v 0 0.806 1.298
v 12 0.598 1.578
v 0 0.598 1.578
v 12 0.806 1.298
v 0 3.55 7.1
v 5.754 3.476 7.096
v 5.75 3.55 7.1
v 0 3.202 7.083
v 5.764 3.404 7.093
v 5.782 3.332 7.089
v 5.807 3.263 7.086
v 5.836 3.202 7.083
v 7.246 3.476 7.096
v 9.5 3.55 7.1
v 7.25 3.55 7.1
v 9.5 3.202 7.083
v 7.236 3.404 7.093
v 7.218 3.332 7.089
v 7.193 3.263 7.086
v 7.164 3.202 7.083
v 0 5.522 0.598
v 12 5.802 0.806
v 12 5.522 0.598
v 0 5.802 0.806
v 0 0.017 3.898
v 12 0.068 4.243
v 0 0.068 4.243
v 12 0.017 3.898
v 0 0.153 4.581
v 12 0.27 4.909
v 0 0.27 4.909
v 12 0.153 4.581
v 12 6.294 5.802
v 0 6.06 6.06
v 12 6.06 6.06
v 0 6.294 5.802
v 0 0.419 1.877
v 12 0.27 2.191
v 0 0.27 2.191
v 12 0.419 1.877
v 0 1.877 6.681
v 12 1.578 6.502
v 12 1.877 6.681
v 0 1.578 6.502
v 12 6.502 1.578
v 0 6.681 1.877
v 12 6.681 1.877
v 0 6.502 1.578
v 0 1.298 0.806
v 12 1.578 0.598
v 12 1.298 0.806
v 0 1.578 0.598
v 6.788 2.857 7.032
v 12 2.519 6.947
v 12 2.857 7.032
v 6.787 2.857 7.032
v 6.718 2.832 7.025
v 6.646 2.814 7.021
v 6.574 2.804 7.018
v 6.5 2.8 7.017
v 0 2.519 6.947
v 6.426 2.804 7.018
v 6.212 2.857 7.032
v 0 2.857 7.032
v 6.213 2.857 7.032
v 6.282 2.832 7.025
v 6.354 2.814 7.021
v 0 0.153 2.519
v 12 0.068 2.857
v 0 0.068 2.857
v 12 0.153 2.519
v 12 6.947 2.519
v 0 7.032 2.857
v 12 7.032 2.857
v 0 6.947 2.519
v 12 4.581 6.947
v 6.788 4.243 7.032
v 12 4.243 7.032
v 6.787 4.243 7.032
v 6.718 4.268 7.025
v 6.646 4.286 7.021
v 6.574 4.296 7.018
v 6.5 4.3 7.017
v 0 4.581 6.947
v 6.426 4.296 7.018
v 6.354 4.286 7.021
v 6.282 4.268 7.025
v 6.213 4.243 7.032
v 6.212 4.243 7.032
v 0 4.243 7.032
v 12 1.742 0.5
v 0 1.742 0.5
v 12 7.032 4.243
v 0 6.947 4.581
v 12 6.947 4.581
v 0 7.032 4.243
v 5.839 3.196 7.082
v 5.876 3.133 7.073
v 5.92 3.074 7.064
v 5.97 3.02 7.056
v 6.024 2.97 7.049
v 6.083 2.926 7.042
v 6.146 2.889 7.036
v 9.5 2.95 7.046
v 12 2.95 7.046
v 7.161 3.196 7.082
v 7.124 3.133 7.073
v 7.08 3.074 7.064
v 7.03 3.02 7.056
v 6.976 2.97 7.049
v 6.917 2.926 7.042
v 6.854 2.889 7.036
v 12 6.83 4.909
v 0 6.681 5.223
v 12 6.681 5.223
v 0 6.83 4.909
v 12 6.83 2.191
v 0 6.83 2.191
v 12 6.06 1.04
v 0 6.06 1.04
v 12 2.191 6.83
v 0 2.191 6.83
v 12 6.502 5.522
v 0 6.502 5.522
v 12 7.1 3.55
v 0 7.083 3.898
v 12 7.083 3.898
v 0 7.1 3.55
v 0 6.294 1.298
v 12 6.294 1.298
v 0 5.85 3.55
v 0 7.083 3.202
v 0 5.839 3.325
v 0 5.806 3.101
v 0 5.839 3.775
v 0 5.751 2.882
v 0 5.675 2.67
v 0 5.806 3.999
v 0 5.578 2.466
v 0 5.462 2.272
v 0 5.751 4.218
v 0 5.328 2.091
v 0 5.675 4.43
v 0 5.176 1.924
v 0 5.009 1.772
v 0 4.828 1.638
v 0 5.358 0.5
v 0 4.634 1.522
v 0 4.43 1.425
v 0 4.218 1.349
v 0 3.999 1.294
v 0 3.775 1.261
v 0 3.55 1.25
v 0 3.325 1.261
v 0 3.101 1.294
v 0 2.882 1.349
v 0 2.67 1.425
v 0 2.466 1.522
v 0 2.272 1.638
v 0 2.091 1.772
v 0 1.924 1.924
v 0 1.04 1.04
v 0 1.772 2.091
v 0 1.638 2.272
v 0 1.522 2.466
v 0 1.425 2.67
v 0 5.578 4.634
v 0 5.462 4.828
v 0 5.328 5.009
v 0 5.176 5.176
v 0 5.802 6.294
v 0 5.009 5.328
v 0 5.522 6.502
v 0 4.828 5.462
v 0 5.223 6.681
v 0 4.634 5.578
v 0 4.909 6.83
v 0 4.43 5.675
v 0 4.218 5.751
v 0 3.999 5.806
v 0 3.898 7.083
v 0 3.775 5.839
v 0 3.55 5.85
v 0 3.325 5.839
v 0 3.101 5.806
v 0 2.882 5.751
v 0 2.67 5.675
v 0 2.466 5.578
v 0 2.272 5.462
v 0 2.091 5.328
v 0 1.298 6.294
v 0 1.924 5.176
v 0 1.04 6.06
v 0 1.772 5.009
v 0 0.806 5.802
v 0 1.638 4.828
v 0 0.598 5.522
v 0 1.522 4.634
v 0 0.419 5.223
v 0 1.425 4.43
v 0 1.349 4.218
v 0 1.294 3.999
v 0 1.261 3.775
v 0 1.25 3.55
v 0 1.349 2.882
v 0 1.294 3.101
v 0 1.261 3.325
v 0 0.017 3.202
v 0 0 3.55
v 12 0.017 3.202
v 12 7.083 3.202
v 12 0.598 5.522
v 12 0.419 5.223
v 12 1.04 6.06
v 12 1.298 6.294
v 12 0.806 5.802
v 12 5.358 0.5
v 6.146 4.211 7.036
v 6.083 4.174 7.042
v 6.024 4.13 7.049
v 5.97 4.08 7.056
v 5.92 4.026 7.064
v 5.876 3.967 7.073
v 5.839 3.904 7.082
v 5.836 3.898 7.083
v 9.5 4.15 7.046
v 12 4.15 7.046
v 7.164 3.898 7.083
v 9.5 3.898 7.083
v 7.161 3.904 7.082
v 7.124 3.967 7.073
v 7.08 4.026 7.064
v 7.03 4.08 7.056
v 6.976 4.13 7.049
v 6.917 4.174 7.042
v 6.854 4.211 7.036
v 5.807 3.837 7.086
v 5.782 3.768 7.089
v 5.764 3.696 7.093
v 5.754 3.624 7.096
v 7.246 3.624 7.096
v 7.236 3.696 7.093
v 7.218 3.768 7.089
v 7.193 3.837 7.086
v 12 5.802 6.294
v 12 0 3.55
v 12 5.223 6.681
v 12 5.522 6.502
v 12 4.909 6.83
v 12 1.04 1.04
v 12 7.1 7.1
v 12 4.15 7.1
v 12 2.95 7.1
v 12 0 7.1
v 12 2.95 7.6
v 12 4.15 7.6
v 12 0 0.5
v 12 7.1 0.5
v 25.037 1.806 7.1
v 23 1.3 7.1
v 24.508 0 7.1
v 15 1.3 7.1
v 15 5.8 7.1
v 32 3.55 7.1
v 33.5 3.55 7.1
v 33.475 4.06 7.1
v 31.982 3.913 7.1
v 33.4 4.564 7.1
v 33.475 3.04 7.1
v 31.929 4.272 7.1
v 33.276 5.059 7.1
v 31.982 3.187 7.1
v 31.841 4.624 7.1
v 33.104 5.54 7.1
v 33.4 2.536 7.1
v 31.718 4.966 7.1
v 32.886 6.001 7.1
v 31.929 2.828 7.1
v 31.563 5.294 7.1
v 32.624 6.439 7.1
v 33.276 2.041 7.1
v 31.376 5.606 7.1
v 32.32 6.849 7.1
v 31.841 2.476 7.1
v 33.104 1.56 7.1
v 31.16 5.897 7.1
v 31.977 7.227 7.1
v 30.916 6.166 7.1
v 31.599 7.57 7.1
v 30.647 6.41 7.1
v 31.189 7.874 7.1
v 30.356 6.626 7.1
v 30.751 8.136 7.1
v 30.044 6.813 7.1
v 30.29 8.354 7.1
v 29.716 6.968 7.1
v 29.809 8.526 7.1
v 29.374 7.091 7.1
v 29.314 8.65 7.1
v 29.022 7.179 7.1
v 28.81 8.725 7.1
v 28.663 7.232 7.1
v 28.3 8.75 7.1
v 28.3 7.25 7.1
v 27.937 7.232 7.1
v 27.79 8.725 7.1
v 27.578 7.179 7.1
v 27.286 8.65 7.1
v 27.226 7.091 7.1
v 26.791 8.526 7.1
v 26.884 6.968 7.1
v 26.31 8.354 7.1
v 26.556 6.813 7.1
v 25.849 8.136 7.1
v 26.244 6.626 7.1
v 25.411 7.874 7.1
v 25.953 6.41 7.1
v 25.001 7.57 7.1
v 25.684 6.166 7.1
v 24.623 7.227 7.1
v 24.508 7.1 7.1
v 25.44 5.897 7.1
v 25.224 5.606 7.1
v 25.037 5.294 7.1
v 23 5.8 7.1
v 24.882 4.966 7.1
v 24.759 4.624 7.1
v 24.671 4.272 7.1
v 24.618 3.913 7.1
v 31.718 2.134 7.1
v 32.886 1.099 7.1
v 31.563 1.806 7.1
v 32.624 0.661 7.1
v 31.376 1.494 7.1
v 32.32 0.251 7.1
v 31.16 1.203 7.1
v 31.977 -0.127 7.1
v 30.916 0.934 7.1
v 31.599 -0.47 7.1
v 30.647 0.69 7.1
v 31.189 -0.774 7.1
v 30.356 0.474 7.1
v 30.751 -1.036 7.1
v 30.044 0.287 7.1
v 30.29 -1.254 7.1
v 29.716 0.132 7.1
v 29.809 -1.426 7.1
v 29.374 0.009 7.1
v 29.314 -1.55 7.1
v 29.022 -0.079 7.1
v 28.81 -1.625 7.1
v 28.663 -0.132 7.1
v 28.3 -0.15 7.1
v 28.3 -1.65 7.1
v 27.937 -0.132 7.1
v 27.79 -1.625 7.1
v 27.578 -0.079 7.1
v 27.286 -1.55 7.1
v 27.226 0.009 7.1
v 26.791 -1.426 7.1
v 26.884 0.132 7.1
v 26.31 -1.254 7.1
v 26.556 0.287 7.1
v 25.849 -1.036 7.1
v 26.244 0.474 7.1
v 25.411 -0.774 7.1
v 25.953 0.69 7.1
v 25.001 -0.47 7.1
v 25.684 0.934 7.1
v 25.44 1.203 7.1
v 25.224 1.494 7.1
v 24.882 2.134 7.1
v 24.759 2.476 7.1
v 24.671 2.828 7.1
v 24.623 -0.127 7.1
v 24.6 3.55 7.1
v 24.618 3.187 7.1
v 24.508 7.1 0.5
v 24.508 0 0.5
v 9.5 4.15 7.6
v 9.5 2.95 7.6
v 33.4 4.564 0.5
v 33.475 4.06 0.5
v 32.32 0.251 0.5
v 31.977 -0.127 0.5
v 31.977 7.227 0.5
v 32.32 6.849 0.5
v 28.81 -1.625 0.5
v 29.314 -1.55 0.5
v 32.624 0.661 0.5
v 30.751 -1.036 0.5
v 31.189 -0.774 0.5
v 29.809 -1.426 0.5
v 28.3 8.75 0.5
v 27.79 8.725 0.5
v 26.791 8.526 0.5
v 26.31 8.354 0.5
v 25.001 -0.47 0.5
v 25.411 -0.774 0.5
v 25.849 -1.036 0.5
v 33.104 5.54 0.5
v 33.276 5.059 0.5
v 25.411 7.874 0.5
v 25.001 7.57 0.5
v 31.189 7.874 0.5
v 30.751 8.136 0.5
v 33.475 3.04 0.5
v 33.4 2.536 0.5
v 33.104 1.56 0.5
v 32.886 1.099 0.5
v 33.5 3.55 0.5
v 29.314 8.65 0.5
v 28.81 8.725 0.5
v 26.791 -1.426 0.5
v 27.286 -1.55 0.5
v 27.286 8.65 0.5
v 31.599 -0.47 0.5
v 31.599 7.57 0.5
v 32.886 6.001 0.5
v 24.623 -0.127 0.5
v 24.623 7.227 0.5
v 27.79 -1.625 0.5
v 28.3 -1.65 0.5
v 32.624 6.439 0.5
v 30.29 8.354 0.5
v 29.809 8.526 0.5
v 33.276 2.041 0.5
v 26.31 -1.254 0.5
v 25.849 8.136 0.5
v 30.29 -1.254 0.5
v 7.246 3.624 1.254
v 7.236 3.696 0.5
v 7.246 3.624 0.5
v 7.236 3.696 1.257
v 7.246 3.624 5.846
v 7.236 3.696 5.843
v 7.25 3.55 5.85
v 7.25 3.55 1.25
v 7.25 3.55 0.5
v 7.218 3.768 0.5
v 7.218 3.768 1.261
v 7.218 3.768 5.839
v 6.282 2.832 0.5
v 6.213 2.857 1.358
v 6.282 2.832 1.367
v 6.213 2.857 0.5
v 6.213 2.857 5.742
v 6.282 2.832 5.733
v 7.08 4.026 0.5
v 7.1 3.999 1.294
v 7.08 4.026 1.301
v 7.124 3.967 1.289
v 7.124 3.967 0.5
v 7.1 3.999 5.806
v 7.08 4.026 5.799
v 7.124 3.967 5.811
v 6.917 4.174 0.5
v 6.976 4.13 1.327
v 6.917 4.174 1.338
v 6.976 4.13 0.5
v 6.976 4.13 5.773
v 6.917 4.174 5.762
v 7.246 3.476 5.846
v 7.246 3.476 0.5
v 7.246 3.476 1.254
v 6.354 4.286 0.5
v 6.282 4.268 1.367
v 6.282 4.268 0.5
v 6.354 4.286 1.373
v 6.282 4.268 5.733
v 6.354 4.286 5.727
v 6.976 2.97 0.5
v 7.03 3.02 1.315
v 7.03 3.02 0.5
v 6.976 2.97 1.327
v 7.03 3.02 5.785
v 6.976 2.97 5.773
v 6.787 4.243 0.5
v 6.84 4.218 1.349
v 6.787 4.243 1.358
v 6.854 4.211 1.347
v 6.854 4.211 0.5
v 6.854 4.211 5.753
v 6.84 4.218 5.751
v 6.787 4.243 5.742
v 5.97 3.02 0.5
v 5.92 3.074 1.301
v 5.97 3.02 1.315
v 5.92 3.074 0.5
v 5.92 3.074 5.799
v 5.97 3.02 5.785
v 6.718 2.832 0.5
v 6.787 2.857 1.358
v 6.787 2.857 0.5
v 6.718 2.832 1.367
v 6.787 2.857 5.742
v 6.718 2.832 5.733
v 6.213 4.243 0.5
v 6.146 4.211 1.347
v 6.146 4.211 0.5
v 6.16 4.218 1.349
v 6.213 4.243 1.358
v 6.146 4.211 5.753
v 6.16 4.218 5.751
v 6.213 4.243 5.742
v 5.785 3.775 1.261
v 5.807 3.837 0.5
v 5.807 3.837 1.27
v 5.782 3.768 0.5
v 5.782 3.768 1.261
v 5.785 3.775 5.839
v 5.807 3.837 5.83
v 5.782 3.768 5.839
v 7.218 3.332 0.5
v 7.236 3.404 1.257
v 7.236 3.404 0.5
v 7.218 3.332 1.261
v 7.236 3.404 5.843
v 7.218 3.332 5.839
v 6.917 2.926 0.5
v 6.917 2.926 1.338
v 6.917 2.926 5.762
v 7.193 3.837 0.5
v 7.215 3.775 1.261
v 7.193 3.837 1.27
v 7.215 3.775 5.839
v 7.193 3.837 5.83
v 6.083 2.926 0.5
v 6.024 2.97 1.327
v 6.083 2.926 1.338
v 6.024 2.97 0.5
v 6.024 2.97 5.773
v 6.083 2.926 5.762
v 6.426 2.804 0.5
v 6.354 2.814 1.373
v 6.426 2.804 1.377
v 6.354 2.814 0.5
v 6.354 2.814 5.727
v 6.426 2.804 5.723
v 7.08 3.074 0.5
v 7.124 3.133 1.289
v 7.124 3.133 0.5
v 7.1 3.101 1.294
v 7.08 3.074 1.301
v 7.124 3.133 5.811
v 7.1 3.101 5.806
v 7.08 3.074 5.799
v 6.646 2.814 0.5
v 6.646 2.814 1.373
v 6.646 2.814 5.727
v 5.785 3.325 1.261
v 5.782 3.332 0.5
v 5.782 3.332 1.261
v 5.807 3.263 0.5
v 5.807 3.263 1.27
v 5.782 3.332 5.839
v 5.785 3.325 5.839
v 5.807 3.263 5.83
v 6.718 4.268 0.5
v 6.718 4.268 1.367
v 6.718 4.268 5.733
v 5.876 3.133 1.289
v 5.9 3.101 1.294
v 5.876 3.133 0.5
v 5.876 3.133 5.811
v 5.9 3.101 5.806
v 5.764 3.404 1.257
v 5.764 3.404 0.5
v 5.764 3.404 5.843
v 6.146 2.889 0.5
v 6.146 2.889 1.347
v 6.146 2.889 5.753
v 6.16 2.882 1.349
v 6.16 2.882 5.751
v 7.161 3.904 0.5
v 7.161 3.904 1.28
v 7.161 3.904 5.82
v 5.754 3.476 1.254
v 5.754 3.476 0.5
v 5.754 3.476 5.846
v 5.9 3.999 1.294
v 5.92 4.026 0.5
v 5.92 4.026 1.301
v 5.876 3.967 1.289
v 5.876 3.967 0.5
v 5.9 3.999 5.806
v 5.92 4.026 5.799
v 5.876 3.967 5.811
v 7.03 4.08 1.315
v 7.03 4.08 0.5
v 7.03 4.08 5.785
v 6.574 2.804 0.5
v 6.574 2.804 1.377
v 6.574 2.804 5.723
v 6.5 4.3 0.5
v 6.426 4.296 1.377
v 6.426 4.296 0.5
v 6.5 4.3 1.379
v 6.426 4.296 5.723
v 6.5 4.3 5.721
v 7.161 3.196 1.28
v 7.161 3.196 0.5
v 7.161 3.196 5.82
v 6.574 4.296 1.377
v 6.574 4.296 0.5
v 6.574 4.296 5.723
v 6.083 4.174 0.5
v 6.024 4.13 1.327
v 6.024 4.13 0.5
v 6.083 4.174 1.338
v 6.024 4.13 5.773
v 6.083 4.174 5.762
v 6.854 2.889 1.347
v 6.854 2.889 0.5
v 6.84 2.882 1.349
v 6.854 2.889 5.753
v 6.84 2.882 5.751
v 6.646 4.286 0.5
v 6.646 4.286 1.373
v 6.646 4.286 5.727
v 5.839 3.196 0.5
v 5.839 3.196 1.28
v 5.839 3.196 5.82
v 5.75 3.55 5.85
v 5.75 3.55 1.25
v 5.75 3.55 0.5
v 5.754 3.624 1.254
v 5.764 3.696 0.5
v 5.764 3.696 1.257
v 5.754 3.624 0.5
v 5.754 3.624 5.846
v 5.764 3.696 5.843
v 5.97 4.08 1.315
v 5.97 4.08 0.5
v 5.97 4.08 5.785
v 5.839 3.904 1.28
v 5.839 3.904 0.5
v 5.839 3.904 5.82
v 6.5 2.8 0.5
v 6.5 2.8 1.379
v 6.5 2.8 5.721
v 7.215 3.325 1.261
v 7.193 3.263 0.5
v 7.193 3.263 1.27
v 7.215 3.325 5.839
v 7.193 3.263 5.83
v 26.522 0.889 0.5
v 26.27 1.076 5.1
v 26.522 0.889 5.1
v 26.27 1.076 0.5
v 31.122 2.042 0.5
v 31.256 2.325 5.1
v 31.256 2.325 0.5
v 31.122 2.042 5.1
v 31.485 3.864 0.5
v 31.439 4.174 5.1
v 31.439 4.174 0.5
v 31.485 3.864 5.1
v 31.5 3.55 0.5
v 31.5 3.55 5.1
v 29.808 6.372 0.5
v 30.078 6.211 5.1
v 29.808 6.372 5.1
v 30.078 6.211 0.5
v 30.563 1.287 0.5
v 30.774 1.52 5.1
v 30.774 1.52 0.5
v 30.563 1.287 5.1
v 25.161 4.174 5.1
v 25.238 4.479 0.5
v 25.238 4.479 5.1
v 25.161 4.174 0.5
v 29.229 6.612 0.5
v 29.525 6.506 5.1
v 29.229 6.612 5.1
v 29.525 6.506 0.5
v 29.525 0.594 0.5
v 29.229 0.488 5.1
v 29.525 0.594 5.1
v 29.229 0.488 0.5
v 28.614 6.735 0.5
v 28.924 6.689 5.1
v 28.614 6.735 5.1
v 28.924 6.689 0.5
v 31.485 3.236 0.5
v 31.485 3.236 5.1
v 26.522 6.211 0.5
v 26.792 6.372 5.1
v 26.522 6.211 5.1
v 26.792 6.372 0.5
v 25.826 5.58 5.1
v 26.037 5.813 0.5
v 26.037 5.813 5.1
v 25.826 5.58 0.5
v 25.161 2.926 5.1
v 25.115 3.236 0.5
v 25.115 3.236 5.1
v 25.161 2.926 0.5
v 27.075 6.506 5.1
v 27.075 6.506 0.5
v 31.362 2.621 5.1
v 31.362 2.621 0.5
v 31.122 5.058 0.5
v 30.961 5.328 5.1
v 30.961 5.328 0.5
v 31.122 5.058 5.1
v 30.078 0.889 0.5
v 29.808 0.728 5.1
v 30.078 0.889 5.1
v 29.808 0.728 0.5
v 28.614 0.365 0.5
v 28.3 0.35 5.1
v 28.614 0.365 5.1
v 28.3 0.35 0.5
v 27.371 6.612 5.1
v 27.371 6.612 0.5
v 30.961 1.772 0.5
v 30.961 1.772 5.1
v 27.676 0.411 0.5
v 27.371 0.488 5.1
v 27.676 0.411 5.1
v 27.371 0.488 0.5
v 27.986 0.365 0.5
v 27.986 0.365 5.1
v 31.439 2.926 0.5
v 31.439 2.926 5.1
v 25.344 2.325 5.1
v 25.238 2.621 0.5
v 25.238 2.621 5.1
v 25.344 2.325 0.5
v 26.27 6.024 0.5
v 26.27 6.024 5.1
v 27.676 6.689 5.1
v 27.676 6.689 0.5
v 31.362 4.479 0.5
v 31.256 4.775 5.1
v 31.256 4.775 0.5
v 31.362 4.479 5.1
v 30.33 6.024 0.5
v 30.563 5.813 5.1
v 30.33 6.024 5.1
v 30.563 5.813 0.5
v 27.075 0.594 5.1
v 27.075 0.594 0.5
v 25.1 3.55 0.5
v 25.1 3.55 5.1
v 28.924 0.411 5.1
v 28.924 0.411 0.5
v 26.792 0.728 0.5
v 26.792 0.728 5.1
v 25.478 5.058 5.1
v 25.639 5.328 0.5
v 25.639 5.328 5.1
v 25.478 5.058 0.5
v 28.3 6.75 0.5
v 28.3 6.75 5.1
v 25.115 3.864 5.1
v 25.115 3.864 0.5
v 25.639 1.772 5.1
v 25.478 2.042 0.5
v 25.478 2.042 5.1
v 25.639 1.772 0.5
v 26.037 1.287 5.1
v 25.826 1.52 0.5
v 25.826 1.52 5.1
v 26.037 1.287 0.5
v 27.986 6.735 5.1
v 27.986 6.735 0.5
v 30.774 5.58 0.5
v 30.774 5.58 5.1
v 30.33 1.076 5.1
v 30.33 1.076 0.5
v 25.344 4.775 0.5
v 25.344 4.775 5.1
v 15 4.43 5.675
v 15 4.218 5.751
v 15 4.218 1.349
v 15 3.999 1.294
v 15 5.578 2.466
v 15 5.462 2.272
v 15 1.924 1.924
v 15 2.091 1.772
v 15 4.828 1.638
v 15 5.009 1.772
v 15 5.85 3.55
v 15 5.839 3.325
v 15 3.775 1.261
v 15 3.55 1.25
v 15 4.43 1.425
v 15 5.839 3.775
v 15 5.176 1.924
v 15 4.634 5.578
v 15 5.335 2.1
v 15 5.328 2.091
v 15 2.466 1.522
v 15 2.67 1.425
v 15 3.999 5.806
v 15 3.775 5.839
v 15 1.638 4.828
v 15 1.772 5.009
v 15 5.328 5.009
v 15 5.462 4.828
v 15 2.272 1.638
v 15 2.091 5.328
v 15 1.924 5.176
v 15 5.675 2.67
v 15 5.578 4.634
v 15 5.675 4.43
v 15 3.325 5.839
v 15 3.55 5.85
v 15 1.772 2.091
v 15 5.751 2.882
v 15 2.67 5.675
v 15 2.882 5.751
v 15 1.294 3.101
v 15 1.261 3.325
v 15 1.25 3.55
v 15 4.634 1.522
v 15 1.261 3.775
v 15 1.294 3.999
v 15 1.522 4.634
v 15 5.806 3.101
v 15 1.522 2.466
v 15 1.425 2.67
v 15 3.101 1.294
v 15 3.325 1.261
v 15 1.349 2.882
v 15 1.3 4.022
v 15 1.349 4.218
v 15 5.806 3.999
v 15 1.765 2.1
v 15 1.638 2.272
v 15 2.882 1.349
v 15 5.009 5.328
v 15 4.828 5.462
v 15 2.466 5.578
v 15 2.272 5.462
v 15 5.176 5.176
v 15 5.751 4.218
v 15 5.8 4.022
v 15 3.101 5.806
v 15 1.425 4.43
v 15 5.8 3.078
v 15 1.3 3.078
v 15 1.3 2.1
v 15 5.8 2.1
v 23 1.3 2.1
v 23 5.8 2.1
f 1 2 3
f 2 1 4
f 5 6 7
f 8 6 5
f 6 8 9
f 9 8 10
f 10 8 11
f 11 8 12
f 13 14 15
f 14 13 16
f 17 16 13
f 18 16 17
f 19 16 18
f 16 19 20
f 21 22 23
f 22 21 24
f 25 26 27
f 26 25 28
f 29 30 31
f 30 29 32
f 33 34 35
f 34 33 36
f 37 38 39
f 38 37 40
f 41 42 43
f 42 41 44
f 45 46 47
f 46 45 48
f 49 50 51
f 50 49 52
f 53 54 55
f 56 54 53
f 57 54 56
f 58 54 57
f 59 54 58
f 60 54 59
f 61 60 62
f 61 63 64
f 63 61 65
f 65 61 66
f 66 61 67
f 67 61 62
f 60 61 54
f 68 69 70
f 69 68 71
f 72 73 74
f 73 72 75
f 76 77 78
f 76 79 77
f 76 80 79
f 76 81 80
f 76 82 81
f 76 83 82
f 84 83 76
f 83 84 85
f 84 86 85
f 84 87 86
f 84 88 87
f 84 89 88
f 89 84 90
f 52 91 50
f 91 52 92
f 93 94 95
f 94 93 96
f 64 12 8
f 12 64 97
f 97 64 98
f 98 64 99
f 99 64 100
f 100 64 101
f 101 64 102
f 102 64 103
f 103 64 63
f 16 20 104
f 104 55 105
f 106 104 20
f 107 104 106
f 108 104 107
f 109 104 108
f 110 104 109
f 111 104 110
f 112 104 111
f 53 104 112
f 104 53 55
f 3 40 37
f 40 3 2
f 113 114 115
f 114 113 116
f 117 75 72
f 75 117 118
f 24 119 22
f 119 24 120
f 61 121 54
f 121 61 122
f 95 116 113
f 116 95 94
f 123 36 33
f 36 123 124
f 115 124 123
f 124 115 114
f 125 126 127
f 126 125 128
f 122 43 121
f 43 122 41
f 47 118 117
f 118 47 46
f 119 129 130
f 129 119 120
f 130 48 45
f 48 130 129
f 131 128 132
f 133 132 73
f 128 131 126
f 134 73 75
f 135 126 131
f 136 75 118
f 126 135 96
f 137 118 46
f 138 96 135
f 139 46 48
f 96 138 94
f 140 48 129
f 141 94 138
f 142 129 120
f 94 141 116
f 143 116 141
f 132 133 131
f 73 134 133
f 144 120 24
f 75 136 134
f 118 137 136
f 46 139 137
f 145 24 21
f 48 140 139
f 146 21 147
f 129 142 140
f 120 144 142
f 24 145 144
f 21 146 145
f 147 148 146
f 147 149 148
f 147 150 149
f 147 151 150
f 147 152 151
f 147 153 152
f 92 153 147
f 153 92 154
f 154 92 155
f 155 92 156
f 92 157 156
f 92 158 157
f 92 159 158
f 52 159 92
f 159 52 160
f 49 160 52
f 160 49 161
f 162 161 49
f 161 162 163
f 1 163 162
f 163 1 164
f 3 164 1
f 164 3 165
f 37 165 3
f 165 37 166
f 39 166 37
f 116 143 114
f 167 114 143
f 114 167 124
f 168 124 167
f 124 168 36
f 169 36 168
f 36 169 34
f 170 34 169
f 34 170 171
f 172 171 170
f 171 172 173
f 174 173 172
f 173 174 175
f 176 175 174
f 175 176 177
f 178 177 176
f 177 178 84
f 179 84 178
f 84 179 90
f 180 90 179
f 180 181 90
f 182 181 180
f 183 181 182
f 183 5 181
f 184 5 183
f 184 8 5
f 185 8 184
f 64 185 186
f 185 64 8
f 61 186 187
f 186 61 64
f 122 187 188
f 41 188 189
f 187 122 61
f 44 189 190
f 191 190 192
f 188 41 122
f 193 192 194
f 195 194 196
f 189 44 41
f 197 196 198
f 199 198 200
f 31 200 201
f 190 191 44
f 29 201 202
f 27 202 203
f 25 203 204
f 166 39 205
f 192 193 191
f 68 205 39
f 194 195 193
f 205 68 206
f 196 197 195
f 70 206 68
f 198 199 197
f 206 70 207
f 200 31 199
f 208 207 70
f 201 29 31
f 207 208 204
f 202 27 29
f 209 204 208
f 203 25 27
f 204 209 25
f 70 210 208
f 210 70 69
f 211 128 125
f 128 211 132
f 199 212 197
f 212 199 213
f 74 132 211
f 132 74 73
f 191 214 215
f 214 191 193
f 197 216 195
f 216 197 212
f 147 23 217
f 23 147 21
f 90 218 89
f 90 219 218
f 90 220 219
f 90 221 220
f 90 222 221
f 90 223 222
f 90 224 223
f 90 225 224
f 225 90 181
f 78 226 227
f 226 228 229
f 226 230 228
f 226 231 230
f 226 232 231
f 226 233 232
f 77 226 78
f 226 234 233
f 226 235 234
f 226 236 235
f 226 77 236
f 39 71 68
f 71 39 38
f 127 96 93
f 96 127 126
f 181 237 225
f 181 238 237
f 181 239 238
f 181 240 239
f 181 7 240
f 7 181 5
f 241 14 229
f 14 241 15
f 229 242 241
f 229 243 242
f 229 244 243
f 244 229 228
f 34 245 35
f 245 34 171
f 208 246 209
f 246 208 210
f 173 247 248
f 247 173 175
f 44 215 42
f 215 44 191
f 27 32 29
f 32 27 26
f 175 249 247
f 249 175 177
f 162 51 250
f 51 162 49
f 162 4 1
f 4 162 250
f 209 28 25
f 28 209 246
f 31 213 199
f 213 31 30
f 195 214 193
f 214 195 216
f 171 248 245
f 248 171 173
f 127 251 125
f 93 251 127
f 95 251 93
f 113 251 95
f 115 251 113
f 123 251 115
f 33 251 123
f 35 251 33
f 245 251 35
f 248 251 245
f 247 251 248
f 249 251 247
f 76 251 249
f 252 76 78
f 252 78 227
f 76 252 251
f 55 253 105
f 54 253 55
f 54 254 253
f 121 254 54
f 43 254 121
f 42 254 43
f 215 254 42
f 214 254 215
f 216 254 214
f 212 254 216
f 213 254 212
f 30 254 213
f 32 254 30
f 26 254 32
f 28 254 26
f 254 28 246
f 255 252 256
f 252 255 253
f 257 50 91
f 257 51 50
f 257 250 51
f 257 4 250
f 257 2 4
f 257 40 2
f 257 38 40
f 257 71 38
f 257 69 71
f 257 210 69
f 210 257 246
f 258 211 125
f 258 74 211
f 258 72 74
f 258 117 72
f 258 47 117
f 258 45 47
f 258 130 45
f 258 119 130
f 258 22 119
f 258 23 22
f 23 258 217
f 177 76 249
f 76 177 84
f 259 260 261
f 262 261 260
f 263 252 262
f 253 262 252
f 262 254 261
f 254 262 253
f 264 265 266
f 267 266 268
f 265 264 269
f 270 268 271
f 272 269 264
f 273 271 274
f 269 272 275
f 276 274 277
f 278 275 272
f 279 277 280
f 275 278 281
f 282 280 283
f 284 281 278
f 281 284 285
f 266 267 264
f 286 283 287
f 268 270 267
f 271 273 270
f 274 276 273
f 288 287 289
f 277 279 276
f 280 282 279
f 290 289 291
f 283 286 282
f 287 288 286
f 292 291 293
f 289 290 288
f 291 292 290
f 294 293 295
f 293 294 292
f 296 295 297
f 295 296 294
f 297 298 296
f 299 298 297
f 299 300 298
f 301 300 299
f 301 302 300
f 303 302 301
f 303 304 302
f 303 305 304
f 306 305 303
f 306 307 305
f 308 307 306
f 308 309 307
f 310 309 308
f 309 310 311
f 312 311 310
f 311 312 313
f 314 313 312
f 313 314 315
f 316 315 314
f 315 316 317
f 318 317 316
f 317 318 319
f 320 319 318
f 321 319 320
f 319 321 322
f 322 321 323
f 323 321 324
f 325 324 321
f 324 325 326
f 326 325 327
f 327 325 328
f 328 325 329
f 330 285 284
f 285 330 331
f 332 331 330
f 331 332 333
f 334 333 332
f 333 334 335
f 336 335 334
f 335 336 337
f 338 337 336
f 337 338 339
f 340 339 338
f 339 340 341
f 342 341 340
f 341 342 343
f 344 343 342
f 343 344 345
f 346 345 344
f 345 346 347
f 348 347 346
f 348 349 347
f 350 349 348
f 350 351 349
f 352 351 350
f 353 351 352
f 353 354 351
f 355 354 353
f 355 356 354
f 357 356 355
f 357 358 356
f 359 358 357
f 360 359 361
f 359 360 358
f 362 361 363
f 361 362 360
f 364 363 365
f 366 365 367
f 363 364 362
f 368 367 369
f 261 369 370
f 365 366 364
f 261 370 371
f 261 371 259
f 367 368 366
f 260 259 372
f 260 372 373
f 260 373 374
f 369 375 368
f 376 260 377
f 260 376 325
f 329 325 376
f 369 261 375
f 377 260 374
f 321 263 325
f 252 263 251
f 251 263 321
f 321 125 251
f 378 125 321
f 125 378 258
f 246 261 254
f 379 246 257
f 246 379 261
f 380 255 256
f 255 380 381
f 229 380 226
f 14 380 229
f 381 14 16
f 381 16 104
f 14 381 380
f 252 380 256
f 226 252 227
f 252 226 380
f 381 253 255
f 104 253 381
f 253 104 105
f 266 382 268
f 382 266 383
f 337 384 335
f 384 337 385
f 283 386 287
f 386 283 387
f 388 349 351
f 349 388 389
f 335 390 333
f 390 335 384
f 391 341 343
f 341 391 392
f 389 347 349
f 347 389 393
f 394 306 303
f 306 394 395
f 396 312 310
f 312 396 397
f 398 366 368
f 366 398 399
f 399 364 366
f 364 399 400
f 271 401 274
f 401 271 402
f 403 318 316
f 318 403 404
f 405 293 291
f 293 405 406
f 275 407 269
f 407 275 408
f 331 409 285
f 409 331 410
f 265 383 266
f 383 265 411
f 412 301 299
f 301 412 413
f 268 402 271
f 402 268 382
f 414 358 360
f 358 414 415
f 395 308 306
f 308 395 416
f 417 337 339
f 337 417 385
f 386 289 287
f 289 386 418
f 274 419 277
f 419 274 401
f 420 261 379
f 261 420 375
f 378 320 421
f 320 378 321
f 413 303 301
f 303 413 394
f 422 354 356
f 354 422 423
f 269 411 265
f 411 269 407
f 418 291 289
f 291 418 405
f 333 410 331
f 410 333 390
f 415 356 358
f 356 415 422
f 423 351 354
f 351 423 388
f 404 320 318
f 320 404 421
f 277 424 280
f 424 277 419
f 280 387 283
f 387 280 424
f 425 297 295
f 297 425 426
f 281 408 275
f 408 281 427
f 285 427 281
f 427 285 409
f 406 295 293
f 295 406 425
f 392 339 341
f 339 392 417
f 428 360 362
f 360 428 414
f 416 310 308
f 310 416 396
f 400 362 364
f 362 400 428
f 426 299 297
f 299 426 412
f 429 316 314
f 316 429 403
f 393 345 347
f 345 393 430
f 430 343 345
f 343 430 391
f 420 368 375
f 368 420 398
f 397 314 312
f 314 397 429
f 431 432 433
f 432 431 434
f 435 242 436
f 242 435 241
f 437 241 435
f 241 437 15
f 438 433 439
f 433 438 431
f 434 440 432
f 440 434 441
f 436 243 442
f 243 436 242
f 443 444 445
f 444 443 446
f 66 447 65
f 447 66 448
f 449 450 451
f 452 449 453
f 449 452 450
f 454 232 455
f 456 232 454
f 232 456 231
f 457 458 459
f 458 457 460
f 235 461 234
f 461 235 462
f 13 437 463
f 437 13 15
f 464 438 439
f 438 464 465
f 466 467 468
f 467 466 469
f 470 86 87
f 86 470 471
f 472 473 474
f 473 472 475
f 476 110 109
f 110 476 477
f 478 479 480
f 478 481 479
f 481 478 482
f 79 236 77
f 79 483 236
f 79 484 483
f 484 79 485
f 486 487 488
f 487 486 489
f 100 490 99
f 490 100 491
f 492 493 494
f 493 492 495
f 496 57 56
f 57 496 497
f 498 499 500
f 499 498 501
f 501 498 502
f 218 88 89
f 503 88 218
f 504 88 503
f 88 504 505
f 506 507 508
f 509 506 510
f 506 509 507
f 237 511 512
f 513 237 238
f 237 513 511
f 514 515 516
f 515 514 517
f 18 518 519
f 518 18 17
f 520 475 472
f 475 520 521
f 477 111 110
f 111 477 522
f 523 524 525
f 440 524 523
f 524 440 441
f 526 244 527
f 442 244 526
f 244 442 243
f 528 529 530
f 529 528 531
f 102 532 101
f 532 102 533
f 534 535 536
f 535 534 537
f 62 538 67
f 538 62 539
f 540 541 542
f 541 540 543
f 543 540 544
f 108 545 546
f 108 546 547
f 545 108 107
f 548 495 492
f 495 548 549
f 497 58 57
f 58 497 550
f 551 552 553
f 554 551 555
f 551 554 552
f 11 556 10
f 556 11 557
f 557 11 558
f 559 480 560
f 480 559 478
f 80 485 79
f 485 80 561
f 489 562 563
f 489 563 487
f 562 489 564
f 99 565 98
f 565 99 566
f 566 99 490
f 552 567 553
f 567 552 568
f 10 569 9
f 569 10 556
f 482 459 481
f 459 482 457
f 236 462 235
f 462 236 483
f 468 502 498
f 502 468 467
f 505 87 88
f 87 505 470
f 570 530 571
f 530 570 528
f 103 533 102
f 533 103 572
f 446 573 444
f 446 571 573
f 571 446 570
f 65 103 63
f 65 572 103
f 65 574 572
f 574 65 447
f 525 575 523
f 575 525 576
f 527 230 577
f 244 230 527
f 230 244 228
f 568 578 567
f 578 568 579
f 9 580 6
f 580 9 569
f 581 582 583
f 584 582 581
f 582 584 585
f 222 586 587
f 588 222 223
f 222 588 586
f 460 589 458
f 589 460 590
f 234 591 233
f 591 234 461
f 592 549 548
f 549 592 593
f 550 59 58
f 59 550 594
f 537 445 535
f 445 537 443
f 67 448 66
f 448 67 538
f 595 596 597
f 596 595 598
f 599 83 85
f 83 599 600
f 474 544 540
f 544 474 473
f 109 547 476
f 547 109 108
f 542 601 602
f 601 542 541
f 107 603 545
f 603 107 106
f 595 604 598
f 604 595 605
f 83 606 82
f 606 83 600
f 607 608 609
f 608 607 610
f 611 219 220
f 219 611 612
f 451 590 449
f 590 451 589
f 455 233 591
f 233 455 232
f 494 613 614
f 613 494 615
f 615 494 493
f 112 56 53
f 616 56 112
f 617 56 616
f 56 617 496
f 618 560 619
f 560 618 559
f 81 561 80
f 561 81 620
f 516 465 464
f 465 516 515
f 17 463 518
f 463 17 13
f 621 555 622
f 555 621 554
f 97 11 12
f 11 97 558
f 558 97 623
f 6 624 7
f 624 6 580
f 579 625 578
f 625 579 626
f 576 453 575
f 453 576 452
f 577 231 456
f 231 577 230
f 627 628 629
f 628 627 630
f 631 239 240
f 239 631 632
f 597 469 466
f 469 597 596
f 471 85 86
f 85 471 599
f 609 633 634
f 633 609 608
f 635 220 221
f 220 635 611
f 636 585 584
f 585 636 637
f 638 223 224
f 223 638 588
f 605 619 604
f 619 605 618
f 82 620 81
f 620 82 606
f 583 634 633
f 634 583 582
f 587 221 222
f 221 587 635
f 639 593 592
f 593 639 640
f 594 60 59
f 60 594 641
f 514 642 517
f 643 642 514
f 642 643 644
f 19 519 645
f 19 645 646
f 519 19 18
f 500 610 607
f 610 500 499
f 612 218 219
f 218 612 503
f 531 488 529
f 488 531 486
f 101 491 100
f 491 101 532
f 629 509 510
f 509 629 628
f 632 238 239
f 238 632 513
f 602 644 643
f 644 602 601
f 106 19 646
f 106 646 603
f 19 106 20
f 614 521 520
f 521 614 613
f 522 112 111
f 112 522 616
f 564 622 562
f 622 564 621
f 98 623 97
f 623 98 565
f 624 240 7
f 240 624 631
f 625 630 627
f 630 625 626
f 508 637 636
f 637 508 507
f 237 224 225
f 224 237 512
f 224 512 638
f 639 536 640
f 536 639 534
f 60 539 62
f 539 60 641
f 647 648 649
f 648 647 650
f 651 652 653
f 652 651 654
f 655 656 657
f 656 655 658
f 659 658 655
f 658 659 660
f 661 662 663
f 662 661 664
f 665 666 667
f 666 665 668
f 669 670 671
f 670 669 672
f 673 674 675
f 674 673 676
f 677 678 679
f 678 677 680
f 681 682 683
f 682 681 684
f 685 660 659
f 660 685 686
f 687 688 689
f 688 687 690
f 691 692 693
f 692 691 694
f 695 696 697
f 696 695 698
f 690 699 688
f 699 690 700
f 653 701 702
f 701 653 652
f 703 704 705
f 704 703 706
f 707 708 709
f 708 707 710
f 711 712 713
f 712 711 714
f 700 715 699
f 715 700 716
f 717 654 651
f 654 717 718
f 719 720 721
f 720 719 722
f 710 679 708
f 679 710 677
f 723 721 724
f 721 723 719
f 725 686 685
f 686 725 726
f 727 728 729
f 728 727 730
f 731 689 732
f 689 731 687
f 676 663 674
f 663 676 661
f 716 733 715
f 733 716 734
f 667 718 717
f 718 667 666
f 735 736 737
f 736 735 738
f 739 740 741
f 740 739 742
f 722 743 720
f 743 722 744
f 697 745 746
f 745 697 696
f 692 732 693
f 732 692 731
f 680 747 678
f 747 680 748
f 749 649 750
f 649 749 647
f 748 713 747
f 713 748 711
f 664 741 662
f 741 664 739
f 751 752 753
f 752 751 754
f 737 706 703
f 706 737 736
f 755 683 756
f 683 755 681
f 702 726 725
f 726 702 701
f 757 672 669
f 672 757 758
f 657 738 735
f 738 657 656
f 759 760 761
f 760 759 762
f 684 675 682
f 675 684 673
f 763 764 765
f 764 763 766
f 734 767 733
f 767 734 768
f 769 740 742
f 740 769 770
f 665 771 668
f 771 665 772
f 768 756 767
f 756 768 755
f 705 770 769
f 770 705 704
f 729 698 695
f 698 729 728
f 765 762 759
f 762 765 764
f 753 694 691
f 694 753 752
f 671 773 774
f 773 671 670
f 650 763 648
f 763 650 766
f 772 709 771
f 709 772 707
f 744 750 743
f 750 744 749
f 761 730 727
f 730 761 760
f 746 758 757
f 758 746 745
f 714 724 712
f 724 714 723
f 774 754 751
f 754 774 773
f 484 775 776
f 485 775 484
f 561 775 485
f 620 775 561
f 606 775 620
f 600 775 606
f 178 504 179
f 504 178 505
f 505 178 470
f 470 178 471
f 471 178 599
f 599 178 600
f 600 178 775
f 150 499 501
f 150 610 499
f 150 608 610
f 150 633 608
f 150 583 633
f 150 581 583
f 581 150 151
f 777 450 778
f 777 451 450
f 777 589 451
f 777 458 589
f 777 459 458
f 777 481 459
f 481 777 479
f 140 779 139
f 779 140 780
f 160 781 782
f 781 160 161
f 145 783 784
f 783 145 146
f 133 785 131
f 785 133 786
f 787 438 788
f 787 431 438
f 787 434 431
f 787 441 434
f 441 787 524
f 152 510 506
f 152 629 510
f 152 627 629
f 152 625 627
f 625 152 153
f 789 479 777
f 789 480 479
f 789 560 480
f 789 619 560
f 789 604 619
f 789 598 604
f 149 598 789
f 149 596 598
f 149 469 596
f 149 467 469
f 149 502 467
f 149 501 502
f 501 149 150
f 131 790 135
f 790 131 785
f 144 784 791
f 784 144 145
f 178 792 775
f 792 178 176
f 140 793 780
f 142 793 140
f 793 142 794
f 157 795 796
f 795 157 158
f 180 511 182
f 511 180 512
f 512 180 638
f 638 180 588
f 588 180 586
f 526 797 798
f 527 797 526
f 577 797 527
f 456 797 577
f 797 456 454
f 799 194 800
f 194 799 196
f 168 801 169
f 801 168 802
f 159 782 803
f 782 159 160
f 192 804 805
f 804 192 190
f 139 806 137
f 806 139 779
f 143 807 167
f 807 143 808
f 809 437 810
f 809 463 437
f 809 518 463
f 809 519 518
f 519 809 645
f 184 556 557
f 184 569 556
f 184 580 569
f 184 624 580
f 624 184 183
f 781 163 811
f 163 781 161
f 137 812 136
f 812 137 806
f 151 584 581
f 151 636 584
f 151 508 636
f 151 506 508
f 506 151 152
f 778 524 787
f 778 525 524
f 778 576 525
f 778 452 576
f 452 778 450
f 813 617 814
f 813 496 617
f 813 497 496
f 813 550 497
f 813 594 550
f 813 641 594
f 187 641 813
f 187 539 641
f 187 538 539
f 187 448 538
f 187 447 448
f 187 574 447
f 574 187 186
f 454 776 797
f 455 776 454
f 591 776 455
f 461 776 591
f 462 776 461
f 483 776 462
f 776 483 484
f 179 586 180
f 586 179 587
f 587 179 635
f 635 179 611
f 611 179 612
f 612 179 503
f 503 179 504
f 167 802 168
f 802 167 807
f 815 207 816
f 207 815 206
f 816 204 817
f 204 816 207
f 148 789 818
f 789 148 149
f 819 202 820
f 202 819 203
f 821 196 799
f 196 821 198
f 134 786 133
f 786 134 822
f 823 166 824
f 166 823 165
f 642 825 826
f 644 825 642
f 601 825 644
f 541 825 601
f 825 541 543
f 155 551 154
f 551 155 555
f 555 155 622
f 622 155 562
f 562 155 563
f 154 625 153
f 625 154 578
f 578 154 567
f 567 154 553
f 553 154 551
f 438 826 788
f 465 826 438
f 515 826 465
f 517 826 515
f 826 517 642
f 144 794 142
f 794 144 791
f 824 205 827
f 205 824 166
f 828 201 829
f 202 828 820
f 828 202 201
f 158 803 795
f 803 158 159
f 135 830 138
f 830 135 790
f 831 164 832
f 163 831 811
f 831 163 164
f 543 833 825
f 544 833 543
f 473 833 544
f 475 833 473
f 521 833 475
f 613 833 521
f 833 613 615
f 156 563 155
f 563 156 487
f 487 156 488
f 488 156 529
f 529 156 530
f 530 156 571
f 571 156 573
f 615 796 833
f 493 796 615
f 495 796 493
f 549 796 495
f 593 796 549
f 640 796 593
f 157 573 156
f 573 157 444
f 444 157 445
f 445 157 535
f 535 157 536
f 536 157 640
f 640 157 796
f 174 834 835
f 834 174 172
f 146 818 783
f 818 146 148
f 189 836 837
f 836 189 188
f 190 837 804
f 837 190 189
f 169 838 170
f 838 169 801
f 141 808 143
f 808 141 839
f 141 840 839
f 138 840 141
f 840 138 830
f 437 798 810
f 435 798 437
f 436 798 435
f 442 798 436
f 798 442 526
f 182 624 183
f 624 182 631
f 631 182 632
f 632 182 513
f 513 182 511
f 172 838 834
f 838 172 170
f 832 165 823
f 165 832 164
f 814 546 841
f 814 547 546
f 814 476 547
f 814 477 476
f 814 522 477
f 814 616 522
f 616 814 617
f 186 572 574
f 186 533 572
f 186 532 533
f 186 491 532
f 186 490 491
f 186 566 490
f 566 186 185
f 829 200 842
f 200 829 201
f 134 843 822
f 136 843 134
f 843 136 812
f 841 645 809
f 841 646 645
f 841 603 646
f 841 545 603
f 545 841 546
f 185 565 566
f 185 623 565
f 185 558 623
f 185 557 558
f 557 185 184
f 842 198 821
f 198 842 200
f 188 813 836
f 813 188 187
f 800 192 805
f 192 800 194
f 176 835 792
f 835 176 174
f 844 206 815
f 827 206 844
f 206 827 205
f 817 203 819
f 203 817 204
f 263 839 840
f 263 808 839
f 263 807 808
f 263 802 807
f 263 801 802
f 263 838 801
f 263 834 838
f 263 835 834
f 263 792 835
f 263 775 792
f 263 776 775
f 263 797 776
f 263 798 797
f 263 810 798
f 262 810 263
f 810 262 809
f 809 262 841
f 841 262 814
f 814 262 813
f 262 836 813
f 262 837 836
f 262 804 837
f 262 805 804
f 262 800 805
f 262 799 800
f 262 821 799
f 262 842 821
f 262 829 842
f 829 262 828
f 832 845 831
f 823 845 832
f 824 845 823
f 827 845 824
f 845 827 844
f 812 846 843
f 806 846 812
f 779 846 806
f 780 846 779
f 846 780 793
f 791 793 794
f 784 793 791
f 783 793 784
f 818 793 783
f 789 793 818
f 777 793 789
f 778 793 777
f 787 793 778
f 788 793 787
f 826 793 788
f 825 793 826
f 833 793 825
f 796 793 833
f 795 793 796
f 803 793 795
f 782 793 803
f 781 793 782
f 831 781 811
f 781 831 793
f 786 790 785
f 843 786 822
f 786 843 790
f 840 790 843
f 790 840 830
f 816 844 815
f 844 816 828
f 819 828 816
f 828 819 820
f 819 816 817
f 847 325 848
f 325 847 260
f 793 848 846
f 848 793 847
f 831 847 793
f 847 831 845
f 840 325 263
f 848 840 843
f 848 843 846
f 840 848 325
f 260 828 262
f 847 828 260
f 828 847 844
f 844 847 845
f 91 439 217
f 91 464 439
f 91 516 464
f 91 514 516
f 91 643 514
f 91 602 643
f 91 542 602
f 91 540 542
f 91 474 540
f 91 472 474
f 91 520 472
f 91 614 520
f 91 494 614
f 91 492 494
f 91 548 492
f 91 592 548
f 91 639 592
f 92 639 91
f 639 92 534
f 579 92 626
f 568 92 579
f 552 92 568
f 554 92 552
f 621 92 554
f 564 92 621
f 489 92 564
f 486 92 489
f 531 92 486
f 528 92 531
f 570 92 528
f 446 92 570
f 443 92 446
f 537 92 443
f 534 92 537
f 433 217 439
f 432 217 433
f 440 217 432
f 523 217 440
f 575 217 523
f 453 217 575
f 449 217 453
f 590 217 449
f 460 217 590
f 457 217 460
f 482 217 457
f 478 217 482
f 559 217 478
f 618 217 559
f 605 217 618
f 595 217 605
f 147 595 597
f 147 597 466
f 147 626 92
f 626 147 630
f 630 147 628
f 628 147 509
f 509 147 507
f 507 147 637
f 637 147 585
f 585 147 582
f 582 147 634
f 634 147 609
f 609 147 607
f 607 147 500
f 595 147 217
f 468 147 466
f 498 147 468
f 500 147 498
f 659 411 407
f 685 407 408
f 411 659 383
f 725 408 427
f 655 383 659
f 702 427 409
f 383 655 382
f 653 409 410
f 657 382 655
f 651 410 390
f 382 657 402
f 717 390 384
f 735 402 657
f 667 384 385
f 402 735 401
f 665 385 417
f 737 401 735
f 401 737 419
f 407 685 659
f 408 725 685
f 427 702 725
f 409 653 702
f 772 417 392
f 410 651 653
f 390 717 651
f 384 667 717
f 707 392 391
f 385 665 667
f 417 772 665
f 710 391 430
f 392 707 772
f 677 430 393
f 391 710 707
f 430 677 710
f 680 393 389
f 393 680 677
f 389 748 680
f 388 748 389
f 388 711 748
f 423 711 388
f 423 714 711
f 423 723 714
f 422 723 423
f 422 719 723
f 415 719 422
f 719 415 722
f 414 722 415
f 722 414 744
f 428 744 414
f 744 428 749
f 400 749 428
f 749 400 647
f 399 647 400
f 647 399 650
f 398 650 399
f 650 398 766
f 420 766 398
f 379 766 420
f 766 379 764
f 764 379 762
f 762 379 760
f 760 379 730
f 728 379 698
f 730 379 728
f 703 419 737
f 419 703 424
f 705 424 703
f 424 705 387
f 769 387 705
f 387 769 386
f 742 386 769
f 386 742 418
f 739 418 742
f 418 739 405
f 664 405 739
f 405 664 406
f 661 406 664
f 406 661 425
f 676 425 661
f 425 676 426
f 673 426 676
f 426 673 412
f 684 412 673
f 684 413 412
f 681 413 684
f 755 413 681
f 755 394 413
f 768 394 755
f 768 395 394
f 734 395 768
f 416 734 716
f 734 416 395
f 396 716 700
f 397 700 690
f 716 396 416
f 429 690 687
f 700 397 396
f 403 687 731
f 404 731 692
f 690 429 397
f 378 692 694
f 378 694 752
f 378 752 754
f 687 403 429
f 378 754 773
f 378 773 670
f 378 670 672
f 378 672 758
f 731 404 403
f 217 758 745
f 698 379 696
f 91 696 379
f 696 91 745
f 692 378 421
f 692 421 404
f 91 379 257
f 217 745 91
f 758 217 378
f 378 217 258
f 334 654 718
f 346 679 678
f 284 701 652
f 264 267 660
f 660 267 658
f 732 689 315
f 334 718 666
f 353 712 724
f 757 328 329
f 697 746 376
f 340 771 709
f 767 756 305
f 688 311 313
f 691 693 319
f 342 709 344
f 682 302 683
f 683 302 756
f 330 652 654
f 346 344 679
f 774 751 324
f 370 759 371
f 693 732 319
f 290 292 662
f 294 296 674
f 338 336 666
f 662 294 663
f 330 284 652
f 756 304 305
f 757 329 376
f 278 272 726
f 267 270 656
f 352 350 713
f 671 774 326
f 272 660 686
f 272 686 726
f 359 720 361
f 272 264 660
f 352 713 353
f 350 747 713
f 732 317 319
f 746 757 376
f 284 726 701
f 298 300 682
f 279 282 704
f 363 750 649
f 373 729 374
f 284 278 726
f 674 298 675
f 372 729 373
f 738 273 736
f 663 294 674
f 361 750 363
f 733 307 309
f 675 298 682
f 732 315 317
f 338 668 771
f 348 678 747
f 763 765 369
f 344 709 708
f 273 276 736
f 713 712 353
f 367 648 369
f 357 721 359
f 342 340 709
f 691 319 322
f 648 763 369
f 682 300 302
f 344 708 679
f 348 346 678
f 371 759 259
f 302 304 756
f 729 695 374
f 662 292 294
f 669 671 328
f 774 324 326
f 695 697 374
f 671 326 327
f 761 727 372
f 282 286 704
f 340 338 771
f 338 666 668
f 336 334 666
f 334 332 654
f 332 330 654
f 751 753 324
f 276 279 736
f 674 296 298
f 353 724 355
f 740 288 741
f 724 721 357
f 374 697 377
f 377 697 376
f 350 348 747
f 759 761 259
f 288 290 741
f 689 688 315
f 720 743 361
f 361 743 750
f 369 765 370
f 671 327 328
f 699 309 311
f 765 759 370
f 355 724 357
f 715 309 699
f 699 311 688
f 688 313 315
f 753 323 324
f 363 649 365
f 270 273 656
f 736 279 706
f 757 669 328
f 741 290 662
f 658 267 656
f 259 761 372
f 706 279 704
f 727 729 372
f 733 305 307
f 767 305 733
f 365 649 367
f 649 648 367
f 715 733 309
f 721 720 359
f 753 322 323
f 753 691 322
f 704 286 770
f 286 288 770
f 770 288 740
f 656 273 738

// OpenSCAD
$fn = 64;
boom_diameter = 7.1;
boom_length = 12;
boom_wall_thickness = 2.5;
motor_diameter = 6.4;
motor_position = -6;
motor_extra_material = 2;
outside_length = 22.3;
hole_position = 6.5;
hole_diameter = 1.5;
number_channels = 2;
channel_offset = 3;
channel_length = 8;
channel_depth = 4.5;
channel_height = 5;
rest_length = 2.5;
rest_depth = 1.2;
rest_overhang = 0.5;
cone_diameter = motor_diameter +1;
cone_height = 2;

difference(){
	union(){
		translate([ 0, boom_diameter/2, boom_diameter/2]){rotate([0,90,0]){
			cylinder(boom_length, boom_diameter/2, boom_diameter/2);
		}}
		translate([ boom_length, 0, 0]){
			cube([ outside_length + motor_position, boom_diameter, boom_diameter]);
		}
		translate([ boom_length - rest_length, ( boom_diameter - rest_depth)/2, 0]){
			cube([ rest_length, rest_depth, boom_diameter+rest_overhang]);
		}
		translate([ boom_length + outside_length + motor_position, boom_diameter/2, 0]){
			cylinder( boom_diameter, motor_diameter/2 + motor_extra_material, motor_diameter/2 + motor_extra_material);
		}
	}
	union(){
		translate([ hole_position, boom_diameter/2, 0]){
			cylinder( boom_diameter, hole_diameter/2, hole_diameter/2);
		}
		translate([ boom_length + outside_length + motor_position, boom_diameter/2, 0]){
			cylinder( boom_diameter, motor_diameter/2, motor_diameter/2);
		}
		translate([ 0, boom_diameter/2, boom_diameter/2]){rotate([0,90,0]){
			cylinder( boom_length + channel_offset, ( boom_diameter - boom_wall_thickness)/2, ( boom_diameter - boom_wall_thickness)/2);
		}}
		translate([ boom_length + channel_offset, ( boom_diameter - channel_depth)/2, boom_diameter - channel_height]){
			cube([ channel_length, channel_depth, channel_height]);
		}
        translate([0,-5,0]){
            cube([50,50,0.5]);
        }
		translate([ boom_length + outside_length + motor_position, boom_diameter/2, boom_diameter - cone_height]){
			cylinder( cone_height, motor_diameter/2, cone_diameter/2);
		}
	}
}
